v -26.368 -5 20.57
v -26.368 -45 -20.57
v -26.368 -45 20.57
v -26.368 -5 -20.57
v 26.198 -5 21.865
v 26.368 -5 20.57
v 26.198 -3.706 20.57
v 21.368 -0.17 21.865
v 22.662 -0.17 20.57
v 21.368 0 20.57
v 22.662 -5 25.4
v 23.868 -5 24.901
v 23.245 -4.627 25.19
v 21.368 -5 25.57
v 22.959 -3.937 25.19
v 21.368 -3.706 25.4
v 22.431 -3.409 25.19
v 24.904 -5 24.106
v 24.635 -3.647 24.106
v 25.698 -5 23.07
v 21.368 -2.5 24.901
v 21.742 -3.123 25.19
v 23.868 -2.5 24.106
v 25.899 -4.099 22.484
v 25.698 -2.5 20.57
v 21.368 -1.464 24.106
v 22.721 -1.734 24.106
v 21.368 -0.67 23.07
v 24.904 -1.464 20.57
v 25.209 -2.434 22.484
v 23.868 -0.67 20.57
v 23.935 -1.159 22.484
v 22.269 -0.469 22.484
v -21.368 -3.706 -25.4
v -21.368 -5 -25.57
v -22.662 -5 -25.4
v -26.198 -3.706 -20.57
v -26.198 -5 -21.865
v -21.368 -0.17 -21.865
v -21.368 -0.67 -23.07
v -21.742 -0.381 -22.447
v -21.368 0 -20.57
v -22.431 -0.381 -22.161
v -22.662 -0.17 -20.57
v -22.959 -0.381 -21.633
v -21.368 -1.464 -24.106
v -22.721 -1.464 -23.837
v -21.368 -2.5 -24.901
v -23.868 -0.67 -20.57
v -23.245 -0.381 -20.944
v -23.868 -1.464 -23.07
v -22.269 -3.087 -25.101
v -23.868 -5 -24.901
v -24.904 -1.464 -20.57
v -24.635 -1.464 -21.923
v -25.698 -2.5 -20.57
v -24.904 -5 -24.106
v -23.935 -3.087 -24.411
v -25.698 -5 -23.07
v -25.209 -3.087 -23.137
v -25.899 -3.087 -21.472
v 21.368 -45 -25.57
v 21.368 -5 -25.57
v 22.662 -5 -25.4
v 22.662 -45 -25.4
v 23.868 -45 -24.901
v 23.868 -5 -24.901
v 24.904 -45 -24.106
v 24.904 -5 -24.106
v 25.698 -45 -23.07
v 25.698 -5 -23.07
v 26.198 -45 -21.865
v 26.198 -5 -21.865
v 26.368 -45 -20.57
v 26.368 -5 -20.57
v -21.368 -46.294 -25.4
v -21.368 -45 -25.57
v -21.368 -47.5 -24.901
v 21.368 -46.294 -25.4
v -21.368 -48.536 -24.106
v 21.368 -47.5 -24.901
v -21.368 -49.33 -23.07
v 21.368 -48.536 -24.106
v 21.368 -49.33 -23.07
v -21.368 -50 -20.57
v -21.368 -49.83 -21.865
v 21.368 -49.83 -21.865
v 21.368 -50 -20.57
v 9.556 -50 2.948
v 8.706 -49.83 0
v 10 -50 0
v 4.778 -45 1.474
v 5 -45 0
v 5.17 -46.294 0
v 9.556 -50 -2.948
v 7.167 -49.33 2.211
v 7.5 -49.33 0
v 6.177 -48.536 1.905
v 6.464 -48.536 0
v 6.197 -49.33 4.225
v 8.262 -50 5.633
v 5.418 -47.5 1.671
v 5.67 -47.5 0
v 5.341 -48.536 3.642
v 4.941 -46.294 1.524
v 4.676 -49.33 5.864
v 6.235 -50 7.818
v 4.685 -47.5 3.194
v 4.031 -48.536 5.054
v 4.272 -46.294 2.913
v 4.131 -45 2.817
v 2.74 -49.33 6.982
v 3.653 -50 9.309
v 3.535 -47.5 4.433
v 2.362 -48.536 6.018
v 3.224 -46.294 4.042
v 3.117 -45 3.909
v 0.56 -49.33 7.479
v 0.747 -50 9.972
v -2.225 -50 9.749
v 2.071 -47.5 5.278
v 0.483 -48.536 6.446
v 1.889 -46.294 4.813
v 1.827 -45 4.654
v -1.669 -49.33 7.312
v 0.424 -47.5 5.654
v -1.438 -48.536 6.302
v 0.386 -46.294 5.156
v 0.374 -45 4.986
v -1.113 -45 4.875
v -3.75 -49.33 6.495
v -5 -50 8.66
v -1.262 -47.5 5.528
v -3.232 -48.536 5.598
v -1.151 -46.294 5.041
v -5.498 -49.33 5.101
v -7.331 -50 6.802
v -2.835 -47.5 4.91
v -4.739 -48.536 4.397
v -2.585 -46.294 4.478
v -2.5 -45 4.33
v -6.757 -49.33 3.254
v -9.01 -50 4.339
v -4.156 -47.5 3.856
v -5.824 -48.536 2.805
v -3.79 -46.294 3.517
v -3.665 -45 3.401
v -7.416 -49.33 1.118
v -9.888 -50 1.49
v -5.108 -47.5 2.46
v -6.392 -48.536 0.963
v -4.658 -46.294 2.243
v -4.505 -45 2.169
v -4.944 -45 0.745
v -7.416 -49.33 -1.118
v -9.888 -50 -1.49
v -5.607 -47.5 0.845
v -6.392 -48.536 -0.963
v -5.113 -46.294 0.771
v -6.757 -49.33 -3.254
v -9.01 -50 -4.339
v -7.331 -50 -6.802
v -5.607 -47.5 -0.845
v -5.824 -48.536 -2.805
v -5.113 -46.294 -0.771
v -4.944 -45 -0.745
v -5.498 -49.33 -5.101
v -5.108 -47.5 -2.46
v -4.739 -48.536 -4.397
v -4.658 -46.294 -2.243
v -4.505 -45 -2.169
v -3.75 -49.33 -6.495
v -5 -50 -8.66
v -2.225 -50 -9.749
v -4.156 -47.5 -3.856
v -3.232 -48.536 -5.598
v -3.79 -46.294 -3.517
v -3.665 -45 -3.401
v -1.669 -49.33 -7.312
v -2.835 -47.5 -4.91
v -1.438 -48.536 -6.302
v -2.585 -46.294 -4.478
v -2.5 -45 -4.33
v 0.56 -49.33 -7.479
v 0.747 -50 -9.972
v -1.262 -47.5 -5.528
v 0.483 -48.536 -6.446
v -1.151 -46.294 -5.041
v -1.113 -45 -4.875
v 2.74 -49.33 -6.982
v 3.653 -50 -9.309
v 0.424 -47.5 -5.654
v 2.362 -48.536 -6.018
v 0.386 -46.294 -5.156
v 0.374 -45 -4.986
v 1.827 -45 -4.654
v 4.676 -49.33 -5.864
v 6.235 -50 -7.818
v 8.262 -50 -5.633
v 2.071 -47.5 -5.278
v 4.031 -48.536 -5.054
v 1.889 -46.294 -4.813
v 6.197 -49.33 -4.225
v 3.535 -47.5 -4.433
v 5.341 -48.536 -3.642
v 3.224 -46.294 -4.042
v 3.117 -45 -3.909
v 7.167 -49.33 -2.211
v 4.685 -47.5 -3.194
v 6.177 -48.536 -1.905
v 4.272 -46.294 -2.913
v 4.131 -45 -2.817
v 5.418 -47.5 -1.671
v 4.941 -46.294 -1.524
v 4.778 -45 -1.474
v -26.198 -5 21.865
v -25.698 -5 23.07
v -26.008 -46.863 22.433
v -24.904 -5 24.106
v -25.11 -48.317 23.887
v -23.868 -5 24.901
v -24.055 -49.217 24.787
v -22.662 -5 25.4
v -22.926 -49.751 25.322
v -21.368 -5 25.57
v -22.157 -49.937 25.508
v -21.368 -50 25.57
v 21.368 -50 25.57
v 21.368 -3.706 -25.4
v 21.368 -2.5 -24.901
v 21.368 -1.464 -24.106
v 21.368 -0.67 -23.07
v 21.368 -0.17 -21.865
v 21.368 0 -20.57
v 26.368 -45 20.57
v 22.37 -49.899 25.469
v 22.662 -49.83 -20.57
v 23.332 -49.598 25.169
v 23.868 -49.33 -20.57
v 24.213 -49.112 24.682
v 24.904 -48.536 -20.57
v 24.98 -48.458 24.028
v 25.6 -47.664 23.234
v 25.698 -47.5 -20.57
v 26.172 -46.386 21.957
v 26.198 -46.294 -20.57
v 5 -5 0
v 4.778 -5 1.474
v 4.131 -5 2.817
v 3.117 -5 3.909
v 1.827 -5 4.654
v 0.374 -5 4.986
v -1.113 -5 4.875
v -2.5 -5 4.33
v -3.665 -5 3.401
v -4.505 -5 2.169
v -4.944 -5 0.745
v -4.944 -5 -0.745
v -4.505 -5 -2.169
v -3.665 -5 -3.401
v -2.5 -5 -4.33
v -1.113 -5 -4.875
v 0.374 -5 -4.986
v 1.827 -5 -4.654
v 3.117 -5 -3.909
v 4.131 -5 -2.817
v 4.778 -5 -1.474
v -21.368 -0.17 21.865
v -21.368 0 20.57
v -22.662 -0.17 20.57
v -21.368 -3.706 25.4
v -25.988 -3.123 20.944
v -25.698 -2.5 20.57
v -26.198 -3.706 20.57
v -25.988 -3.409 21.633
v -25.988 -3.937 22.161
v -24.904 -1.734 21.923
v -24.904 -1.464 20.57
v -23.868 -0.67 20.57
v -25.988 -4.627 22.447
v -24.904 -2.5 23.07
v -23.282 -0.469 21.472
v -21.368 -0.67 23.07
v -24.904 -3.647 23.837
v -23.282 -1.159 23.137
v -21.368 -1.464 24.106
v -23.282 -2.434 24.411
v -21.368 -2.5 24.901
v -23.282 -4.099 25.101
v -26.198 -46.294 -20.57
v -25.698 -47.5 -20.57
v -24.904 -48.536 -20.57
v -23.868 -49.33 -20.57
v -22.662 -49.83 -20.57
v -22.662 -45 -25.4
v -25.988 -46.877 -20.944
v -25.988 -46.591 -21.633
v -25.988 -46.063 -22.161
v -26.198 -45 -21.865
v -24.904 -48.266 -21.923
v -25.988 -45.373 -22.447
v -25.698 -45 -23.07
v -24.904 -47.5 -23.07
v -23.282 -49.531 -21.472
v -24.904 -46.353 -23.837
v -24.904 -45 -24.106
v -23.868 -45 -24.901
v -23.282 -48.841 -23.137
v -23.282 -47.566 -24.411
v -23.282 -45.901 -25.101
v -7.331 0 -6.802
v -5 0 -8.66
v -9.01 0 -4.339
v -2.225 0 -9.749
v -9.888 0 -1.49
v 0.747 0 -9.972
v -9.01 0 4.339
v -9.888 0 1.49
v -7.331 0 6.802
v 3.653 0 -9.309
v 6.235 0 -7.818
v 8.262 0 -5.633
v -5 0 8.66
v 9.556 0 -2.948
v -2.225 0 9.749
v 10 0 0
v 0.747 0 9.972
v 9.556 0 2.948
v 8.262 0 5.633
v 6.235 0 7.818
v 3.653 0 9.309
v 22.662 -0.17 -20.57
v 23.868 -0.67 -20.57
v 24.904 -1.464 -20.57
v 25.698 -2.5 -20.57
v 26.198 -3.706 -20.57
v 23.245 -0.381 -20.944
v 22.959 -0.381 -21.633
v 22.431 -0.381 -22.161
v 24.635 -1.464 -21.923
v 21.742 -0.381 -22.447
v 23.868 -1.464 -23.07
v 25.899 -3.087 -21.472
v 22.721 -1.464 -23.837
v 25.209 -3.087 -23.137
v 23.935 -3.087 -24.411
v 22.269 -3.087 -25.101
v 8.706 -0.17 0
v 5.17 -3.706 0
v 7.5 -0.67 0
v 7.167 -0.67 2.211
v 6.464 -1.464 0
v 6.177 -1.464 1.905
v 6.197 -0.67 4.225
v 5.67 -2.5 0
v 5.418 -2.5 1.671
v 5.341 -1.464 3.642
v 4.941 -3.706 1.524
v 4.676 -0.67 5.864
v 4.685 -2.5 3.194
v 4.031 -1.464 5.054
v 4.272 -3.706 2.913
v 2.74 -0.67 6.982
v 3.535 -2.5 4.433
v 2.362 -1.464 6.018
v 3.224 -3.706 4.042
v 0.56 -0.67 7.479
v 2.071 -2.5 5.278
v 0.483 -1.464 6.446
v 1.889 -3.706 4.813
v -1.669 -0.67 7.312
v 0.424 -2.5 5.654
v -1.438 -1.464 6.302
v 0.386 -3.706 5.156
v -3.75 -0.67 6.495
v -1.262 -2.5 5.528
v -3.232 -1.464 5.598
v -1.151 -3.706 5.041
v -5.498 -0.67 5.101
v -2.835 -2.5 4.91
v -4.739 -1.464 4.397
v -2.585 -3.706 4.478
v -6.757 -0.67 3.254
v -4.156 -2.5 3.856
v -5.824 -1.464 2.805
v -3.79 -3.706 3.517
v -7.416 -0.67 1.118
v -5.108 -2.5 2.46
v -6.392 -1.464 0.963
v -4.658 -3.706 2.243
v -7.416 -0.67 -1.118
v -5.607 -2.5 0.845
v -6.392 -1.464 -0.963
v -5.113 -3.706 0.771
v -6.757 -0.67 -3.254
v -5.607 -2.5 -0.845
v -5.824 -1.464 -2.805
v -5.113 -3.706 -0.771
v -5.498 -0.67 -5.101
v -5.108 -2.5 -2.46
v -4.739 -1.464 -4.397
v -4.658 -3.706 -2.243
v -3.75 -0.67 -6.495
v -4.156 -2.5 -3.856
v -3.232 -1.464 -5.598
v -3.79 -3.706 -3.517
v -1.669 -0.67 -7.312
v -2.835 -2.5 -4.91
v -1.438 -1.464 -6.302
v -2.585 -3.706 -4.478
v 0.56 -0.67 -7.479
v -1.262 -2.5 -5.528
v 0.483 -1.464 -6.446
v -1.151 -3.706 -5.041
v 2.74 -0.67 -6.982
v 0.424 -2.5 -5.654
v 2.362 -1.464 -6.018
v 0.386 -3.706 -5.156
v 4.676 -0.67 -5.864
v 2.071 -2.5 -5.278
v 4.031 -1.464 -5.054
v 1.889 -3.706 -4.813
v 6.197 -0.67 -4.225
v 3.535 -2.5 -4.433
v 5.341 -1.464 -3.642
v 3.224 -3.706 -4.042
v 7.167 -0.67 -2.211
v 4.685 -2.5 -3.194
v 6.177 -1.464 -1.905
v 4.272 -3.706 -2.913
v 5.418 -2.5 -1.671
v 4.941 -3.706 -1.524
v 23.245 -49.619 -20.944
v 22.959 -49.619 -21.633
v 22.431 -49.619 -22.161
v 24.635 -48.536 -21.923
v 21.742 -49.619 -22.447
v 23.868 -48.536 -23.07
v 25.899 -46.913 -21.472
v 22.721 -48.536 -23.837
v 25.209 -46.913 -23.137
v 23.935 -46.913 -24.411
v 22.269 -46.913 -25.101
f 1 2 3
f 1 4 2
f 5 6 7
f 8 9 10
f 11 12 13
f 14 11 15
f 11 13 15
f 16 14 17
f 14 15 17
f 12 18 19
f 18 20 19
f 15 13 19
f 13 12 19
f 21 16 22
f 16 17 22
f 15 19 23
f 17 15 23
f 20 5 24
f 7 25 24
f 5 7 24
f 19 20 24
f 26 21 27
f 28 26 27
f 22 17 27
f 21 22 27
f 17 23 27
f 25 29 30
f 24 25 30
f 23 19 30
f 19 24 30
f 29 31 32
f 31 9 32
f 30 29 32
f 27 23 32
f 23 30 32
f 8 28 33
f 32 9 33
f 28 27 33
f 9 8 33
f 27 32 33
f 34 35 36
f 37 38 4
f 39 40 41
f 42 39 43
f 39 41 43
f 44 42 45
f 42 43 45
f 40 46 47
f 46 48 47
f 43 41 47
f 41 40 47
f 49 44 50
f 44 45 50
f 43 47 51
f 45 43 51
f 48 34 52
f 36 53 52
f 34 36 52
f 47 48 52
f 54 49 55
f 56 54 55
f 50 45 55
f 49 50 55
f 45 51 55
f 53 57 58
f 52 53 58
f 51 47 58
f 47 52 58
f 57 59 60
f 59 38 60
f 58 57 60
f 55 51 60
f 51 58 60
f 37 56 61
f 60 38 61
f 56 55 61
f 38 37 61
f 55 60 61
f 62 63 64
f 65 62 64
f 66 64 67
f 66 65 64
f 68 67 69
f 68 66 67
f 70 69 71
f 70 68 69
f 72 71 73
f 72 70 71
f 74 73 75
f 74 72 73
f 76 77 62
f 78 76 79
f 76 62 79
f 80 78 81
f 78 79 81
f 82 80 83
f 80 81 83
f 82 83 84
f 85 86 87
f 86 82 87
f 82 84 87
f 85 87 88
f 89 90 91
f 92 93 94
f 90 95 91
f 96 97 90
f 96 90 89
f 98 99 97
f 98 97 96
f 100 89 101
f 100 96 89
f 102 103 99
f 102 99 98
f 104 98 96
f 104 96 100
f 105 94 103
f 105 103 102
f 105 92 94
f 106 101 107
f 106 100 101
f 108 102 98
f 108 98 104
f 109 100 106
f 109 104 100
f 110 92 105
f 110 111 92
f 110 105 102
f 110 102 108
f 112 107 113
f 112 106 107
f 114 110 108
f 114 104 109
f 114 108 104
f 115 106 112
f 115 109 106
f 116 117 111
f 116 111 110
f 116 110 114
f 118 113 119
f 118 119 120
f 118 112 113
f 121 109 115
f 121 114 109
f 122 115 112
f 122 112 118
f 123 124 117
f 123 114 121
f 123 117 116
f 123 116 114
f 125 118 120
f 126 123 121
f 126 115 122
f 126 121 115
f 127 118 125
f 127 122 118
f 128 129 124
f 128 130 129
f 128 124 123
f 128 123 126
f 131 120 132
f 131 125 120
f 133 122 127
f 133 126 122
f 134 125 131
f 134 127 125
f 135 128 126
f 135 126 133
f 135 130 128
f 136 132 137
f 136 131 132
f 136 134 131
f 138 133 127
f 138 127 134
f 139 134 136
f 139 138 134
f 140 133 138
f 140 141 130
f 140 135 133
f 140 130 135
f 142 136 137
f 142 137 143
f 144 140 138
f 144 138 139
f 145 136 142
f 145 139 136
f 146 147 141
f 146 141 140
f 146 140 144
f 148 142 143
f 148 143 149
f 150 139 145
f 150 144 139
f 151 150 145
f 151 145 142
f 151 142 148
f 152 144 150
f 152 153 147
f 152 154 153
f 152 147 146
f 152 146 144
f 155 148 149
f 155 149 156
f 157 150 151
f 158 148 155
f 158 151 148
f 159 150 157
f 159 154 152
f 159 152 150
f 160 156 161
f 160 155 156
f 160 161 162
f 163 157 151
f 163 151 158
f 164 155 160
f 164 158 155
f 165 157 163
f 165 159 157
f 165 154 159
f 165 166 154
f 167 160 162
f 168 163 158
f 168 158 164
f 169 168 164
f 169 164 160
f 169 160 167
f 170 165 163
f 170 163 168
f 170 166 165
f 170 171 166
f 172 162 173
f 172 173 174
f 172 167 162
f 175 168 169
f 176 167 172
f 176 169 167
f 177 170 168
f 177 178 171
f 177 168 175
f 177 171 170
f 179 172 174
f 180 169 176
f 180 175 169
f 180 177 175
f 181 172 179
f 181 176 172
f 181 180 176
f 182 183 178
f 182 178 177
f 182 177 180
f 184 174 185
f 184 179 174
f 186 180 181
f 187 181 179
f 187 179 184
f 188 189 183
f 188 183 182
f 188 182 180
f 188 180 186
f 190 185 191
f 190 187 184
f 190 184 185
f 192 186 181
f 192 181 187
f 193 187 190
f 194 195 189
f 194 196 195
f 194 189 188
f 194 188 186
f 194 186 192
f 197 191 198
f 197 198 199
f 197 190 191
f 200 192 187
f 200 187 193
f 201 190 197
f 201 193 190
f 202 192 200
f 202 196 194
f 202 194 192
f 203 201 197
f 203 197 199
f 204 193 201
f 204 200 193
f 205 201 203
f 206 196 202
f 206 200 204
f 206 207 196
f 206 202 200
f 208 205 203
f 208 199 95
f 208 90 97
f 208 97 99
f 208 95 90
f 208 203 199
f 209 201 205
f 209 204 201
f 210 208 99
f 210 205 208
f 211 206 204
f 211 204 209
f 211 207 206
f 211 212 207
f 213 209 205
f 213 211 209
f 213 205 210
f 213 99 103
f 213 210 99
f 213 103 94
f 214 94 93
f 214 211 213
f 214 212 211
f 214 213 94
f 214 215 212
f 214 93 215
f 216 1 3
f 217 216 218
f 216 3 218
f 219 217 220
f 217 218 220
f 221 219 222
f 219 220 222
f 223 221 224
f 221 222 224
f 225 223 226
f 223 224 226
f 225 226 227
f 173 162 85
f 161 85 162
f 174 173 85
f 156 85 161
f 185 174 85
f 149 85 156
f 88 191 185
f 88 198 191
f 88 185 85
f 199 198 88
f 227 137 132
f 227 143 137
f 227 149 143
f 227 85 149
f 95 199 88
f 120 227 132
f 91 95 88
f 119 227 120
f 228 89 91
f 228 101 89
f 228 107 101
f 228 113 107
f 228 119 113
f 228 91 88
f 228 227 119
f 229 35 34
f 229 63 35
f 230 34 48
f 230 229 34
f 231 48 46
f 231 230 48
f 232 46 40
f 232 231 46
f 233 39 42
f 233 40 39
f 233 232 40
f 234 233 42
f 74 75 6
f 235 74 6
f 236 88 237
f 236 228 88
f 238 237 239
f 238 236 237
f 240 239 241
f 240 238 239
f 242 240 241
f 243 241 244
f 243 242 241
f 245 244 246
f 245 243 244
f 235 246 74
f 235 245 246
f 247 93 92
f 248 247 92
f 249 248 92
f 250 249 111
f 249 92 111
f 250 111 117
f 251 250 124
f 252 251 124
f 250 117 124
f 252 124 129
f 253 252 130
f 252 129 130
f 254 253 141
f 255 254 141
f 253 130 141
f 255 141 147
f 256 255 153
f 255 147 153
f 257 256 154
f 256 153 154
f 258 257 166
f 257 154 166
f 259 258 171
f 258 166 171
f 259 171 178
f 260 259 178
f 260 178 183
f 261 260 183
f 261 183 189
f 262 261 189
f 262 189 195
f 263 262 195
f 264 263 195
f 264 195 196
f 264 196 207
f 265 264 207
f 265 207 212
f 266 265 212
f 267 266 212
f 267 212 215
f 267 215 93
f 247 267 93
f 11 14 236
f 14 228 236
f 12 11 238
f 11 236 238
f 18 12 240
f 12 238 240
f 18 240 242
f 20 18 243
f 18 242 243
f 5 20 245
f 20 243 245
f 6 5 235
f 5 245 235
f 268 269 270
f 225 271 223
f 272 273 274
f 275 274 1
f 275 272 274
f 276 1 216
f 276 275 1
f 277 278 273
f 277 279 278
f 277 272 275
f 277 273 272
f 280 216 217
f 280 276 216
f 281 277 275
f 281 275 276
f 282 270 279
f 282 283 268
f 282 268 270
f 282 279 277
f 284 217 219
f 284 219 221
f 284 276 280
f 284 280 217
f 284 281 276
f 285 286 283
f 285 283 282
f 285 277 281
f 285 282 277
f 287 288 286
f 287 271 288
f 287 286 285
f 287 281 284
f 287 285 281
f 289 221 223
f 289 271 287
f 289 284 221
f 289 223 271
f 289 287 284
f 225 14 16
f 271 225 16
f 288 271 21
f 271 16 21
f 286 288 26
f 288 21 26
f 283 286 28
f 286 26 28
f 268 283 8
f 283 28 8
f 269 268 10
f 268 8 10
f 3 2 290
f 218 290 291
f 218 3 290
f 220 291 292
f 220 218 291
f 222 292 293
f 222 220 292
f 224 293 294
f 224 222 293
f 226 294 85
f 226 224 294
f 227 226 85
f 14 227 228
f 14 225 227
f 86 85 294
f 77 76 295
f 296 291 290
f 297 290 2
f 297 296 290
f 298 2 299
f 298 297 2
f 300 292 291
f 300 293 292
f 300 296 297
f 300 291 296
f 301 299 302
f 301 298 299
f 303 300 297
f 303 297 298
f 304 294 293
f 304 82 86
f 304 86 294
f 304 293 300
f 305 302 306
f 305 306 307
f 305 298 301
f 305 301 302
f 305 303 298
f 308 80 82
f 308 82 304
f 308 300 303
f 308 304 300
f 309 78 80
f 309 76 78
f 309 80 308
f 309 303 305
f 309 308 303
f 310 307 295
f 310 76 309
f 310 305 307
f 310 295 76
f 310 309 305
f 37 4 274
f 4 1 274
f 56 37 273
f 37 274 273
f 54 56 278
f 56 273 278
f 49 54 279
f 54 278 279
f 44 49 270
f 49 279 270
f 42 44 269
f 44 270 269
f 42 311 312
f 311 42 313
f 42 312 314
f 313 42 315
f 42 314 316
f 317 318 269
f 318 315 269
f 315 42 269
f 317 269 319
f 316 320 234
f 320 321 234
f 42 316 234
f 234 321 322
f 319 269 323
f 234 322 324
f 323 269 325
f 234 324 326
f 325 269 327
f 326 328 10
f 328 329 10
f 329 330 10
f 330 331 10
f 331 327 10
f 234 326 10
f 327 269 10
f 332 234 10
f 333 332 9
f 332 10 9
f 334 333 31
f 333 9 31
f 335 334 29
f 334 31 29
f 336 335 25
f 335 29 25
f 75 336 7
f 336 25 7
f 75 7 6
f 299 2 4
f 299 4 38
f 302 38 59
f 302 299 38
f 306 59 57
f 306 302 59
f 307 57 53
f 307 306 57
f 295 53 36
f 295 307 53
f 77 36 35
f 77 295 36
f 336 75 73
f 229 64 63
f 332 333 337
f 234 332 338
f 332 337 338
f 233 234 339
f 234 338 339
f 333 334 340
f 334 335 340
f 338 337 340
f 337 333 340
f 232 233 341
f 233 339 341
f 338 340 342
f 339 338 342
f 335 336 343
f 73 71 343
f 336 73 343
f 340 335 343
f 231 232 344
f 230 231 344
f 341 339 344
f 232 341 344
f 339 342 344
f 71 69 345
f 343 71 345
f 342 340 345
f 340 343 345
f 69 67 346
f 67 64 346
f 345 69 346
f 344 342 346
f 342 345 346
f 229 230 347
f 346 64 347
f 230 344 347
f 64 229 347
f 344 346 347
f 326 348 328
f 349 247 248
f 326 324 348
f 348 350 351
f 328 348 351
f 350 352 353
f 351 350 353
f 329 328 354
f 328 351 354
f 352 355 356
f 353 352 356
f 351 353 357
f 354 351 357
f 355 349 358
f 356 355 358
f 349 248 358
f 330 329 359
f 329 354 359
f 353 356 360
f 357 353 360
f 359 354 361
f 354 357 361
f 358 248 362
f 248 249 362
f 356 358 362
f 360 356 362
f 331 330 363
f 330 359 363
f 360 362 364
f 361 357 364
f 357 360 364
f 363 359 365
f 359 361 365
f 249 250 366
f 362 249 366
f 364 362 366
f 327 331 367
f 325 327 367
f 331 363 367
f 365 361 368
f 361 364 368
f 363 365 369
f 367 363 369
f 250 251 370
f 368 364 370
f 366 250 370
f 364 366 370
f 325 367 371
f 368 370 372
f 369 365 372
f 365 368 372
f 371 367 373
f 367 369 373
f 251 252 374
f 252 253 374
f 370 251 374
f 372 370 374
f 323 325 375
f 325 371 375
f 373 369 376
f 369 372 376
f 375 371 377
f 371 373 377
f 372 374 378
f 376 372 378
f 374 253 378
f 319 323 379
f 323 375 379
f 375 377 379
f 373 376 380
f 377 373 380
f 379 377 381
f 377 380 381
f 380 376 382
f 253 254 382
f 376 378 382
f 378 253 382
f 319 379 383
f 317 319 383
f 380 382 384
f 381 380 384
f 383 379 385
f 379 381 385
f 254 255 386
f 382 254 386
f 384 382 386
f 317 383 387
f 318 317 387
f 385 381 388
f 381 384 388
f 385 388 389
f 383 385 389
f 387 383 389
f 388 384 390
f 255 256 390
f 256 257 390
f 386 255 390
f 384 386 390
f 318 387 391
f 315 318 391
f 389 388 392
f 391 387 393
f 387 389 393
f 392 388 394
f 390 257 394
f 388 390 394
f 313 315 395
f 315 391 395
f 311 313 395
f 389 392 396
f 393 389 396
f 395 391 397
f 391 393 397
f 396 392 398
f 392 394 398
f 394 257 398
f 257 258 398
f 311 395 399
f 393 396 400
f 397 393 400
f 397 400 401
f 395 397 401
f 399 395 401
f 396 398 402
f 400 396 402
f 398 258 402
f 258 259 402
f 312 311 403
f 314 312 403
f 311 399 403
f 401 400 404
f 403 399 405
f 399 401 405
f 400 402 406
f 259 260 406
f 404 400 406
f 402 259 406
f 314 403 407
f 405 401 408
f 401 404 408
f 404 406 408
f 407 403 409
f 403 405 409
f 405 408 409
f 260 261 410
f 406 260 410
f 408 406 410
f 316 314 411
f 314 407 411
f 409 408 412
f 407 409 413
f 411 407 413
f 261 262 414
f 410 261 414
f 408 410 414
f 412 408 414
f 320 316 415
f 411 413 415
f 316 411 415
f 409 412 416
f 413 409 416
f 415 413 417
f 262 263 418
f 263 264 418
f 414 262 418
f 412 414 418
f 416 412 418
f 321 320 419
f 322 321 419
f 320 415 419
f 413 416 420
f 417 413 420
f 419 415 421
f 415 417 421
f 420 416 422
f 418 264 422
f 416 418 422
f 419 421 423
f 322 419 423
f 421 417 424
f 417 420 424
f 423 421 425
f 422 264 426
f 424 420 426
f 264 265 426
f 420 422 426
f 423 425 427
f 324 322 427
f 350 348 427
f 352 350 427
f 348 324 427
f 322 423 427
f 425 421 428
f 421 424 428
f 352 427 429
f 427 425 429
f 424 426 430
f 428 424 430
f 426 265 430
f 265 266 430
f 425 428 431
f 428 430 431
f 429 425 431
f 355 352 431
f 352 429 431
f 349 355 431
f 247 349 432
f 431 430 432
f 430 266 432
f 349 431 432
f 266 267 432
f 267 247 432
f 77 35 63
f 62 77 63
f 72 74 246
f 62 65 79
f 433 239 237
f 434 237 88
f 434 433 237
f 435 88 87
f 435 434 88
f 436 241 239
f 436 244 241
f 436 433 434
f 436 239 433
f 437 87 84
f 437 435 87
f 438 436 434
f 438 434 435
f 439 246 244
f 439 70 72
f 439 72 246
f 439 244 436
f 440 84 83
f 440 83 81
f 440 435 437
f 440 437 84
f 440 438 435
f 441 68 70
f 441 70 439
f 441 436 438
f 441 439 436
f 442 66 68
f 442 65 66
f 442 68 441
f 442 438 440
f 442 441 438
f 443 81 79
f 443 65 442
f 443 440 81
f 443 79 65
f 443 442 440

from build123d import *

# Parameters (mm, degrees)
F0_W     = 52.736438
F0_H     = 51.140826
F1_DEPTH = 50
F2_R     = 5
F3_DEPTH = 50.001
F4_R     = 5


with BuildPart() as f1:
    # F0 (on Front) → F1 (new body)
    with BuildSketch(Plane.XZ):
        Rectangle(F0_W, F0_H)
    extrude(amount=F1_DEPTH)

    # F2 (on face) → F3 (cut, through all)
    with BuildSketch(Plane.XZ.offset(50)):
        Circle(F2_R)
    extrude(amount=-F3_DEPTH, mode=Mode.SUBTRACT)

    # F4
    f4_edges = [f1.edges().sort_by_distance(p)[0] for p in [
        (-5, -50, 0),
        (-5, 0, 0),
        (26.368219, -25, -25.570413),
        (26.368219, -50, 0),
        (26.368219, 0, 0),
        (26.368219, -25, 25.570413),
        (0, -50, -25.570413),
        (-26.368219, -50, 0),
        (-26.368219, -25, -25.570413),
        (0, 0, -25.570413),
        (0, 0, 25.570413),
        (-26.368219, 0, 0),
        (-26.368219, -25, 25.570413),
    ]]
    fillet(f4_edges, radius=F4_R)


solid = f1.part
